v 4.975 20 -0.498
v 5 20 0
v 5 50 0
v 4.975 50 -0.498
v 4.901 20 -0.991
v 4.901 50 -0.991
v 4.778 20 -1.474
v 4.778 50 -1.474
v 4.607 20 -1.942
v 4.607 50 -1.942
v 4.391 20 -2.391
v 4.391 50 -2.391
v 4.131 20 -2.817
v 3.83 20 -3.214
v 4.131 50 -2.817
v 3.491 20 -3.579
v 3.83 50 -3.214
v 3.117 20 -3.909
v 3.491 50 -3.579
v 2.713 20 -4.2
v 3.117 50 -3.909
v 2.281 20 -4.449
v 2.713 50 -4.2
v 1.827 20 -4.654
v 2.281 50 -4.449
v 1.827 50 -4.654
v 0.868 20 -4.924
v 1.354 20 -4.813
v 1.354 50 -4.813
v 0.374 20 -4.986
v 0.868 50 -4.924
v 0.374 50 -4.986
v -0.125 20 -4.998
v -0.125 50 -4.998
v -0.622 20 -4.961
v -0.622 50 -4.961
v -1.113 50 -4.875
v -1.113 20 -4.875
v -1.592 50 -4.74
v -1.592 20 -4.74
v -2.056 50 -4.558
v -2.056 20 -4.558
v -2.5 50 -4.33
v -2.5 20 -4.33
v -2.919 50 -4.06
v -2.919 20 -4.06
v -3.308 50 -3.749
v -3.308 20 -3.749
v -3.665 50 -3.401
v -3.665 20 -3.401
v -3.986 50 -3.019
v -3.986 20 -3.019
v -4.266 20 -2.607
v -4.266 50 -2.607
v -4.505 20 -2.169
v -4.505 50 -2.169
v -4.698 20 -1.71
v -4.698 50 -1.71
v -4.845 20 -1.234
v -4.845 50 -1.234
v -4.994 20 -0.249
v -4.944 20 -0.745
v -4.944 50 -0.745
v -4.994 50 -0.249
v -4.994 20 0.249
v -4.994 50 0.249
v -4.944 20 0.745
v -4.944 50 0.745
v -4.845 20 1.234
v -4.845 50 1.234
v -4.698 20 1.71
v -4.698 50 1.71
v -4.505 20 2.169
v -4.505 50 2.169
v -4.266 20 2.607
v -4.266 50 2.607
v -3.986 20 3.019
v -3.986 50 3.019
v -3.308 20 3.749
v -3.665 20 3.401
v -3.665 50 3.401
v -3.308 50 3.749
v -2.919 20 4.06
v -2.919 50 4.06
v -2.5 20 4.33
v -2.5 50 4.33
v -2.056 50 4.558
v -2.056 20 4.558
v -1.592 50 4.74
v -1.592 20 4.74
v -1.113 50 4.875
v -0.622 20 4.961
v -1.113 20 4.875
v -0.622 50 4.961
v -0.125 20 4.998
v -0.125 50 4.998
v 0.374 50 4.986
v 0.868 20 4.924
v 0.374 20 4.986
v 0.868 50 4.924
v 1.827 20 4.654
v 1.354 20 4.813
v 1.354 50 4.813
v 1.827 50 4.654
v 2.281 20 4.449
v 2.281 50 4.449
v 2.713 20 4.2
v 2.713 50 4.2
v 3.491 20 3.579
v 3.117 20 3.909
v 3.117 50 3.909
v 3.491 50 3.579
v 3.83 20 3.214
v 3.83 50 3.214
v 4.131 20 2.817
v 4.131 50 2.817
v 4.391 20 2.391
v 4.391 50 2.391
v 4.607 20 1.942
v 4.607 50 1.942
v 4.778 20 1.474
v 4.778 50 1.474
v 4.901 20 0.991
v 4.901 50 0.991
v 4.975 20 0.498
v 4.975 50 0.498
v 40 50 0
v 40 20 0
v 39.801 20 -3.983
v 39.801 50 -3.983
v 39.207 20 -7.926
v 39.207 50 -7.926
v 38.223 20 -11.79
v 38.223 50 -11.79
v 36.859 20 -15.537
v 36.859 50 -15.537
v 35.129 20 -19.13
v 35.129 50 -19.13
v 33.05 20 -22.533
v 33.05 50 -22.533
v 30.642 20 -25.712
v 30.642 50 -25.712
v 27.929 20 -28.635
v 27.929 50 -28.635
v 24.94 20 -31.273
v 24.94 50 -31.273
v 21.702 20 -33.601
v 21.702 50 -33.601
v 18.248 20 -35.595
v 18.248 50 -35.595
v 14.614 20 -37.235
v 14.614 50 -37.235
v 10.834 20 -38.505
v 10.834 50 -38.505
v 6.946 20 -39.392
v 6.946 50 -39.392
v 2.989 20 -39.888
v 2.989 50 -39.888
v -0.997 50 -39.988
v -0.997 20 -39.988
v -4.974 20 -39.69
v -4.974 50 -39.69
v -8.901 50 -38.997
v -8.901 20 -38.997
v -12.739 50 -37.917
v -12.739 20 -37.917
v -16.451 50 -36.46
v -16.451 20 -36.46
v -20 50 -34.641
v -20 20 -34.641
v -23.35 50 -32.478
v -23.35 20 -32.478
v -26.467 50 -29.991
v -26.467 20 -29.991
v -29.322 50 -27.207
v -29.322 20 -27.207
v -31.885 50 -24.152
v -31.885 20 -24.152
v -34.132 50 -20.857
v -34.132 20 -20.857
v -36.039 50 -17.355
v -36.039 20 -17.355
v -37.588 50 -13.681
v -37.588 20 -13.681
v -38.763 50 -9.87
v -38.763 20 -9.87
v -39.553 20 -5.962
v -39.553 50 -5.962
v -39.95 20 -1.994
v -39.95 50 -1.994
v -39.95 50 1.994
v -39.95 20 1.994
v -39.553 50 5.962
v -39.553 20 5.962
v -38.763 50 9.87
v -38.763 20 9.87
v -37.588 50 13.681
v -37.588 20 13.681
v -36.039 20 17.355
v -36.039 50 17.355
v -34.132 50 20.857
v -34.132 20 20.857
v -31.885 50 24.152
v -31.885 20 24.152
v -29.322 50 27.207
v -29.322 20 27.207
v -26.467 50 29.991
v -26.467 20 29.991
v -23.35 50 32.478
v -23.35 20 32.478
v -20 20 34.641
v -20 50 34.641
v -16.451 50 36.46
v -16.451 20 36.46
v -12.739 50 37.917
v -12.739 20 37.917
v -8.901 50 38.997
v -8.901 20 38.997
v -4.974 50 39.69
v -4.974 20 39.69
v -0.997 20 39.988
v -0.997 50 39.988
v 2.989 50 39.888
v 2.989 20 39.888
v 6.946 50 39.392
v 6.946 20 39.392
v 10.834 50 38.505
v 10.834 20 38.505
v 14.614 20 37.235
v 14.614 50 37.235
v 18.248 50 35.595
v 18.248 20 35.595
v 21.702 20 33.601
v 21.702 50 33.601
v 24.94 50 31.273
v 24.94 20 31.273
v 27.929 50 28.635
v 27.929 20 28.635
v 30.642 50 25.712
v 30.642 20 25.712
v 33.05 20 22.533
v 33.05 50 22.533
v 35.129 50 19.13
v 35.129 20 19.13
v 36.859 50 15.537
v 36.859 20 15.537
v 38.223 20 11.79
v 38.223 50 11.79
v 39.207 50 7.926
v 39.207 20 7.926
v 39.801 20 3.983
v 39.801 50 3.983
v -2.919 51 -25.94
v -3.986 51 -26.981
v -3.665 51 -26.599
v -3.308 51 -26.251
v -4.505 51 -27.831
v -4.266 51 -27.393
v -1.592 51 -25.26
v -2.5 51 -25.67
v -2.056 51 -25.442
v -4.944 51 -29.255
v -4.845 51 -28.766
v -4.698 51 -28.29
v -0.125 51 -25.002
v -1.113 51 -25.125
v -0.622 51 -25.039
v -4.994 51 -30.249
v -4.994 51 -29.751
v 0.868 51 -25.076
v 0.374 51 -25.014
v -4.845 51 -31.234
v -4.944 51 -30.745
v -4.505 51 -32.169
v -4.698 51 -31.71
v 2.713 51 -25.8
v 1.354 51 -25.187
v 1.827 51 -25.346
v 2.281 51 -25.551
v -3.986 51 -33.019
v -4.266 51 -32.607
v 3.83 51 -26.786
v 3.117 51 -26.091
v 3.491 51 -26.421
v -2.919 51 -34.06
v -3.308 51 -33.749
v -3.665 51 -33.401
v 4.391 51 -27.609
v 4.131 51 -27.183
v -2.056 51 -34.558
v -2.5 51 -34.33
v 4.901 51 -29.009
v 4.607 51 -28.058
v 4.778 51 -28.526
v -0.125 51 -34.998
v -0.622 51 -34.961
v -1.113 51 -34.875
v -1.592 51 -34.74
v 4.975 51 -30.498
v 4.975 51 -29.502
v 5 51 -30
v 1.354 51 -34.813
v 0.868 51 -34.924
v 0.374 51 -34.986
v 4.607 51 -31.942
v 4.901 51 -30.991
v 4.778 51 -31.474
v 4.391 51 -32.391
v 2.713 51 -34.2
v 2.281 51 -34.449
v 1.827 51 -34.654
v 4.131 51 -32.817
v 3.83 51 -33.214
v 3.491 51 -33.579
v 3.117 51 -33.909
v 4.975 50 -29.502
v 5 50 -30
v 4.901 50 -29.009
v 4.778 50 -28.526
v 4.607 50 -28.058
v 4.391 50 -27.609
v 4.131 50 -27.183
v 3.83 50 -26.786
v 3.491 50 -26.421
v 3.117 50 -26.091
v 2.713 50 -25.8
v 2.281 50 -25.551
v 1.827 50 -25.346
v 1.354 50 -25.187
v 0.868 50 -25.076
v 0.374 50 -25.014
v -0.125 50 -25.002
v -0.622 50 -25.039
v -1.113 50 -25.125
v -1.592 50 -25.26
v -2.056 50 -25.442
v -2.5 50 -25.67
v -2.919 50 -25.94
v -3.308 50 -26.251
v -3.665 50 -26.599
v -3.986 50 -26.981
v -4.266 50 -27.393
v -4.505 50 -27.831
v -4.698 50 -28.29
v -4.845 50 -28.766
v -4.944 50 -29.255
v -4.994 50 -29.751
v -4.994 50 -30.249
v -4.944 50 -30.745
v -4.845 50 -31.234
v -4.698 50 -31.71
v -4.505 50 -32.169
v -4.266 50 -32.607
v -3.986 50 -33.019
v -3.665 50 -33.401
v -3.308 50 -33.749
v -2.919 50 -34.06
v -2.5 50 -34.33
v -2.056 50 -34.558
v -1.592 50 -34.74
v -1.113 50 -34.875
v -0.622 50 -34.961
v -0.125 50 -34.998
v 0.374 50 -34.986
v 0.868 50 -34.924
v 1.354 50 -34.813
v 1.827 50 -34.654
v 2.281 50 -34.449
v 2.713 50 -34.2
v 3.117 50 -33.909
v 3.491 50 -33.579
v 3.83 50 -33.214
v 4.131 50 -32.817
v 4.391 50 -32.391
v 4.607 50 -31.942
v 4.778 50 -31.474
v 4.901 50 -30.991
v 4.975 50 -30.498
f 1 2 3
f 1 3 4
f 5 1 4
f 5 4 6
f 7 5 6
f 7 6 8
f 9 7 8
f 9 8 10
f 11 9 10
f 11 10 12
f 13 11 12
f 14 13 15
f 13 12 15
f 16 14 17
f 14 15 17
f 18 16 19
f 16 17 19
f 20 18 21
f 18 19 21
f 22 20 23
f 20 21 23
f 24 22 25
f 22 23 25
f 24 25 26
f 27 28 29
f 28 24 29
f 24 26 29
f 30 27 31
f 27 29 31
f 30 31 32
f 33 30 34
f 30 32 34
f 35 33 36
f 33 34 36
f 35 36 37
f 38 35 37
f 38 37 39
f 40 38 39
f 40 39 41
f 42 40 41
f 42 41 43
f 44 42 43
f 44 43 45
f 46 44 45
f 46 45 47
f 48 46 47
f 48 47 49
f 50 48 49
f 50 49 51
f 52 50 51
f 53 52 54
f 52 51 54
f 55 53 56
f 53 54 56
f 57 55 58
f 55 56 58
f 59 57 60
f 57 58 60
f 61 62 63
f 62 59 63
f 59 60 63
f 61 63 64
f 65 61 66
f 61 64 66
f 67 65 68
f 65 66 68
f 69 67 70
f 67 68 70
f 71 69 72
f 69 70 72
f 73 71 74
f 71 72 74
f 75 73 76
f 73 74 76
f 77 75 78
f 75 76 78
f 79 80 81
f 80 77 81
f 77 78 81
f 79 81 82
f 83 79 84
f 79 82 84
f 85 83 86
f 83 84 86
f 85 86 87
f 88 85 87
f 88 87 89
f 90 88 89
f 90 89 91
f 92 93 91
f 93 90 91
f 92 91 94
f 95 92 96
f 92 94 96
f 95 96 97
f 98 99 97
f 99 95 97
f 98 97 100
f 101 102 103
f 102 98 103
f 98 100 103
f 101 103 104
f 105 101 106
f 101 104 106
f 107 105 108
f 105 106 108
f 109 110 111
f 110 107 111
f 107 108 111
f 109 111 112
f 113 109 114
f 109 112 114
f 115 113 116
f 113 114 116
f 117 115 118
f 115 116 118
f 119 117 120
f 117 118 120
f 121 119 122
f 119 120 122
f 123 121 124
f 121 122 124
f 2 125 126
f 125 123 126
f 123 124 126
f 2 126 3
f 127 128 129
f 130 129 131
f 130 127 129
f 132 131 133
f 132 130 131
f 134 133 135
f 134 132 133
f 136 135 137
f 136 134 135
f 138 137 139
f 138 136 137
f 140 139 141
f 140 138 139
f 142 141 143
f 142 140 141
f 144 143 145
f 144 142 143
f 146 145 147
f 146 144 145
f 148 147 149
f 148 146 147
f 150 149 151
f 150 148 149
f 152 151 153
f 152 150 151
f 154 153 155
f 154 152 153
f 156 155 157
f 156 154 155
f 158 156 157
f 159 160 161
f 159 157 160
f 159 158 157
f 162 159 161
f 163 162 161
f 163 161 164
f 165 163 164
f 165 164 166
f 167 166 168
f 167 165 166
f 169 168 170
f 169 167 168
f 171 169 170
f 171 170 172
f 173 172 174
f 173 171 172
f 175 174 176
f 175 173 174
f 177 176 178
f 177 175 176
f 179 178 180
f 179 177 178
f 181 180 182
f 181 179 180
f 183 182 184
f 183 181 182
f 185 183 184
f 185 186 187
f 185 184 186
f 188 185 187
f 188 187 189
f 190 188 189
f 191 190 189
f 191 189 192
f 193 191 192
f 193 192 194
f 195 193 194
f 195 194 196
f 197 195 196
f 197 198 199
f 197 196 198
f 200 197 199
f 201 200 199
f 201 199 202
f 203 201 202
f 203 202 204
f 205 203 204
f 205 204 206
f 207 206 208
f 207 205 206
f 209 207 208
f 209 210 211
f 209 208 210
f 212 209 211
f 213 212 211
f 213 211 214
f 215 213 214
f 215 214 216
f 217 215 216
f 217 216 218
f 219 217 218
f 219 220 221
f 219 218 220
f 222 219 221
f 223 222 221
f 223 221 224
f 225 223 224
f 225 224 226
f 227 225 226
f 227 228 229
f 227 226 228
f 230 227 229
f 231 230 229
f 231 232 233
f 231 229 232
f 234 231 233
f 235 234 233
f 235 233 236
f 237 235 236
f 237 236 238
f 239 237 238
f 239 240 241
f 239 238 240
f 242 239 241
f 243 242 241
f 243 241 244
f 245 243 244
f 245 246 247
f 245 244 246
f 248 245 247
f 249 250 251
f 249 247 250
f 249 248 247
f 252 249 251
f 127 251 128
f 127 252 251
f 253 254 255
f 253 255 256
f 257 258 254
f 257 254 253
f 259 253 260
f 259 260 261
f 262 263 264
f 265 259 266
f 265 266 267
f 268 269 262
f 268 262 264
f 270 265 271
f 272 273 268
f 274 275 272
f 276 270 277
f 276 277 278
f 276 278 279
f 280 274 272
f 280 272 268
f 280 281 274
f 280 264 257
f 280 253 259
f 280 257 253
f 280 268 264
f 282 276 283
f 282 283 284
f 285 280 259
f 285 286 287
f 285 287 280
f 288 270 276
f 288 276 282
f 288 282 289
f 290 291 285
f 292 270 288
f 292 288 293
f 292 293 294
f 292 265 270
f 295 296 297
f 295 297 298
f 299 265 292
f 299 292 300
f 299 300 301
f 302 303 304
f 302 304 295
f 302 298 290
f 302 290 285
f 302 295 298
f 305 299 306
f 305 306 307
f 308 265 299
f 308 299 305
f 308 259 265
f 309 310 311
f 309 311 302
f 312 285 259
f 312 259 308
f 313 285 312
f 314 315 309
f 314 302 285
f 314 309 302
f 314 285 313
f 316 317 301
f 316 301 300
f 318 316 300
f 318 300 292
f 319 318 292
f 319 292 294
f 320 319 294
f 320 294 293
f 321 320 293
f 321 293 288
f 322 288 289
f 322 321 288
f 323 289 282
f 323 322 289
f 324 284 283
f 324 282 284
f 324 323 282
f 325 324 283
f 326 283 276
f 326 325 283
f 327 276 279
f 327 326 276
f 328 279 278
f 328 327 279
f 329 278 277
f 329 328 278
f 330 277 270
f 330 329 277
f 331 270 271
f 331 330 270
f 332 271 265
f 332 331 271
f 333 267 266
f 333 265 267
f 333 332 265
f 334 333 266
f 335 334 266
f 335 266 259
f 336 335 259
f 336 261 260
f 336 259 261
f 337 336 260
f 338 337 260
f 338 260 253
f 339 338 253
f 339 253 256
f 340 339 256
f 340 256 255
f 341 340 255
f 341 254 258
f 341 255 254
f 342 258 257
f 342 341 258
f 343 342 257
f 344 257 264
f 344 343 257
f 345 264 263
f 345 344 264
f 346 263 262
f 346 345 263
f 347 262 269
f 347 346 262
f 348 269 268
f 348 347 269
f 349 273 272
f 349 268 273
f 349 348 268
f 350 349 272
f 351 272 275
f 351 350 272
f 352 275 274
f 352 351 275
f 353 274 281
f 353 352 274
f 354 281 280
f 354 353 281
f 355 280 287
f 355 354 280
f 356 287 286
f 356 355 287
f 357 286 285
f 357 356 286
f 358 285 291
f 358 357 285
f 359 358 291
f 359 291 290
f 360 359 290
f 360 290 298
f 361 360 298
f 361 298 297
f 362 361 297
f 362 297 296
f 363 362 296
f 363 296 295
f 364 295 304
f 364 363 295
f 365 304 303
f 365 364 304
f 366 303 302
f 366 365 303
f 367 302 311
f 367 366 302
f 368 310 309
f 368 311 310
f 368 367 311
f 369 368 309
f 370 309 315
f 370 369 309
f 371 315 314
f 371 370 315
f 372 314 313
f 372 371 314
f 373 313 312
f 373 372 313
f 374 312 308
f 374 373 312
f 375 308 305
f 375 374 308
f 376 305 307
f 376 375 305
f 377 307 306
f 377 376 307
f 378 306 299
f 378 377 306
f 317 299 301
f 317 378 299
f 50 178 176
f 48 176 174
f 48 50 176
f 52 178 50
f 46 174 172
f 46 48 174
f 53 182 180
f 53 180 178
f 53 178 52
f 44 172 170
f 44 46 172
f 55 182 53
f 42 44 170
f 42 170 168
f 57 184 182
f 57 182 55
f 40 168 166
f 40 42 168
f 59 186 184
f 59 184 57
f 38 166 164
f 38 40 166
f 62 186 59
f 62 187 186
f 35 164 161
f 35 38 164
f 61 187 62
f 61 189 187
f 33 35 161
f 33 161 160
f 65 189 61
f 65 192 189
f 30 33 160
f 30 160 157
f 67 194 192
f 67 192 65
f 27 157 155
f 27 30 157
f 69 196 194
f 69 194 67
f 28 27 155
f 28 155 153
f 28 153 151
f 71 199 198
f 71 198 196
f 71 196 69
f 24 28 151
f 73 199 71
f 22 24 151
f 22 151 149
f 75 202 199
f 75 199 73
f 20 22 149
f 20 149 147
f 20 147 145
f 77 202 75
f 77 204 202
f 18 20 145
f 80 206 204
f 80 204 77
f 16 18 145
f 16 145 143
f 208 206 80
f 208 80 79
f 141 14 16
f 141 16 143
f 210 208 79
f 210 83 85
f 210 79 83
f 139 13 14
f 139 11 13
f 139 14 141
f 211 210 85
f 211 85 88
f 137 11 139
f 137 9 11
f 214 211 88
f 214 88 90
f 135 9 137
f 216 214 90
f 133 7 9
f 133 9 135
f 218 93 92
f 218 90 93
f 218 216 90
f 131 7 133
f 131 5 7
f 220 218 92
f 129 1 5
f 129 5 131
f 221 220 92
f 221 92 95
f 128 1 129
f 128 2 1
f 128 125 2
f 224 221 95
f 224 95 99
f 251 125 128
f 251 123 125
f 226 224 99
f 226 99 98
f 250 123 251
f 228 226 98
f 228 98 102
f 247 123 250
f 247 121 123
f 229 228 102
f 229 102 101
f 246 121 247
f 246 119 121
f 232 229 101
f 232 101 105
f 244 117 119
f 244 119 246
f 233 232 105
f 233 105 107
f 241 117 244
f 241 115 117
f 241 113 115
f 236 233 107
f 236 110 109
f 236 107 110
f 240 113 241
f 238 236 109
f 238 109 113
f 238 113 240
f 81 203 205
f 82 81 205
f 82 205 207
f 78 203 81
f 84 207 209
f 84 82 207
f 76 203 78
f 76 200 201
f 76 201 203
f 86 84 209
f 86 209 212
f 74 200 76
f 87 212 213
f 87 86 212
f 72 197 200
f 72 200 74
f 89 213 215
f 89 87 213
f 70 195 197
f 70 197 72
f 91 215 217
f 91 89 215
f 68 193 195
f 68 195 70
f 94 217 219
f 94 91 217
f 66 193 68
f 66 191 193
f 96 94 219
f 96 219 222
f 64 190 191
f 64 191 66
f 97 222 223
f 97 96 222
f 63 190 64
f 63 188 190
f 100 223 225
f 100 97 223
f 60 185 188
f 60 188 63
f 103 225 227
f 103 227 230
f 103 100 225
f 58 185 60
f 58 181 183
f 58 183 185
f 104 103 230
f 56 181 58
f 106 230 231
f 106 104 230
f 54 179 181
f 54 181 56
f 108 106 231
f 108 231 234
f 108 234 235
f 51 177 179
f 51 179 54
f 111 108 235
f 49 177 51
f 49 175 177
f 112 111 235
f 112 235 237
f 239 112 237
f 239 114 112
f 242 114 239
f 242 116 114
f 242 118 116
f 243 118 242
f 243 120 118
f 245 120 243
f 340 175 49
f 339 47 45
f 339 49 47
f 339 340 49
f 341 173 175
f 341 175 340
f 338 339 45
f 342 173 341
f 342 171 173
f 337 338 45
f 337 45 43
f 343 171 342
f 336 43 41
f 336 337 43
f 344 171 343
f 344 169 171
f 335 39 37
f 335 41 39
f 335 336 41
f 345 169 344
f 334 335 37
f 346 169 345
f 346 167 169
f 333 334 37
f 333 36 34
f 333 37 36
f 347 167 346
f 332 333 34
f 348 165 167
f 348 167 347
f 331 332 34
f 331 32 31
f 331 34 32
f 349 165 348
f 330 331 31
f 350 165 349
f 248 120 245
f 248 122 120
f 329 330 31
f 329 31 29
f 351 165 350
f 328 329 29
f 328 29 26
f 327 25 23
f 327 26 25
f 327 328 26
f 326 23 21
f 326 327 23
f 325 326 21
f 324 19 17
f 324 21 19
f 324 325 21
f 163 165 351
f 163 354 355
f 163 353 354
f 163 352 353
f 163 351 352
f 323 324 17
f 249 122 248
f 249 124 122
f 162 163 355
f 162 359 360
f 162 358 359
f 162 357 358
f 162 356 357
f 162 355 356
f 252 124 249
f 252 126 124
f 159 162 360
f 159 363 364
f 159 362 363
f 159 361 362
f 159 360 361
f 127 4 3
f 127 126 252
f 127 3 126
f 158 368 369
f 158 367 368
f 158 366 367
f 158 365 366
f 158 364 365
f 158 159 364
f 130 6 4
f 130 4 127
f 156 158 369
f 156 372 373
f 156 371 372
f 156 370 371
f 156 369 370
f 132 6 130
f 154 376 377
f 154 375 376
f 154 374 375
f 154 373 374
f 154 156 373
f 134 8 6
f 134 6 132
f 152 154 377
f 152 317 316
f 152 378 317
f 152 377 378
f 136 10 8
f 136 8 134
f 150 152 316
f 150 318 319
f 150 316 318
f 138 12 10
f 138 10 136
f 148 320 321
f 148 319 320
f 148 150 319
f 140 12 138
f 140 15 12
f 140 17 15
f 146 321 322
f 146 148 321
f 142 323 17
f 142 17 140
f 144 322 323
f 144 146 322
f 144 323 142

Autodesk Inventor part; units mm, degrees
ref_plane "YZ Plane" through (0, 0, 0) normal (1, 0, 0) x (0, 1, 0)
ref_plane "XZ Plane" through (0, 0, 0) normal (0, 1, 0) x (-1, 0, 0)
ref_plane "XY Plane" through (0, 0, 0) normal (0, 0, 1) x (1, 0, 0)
sketch "Sketch1" plane through (0, 0, 0) normal (0, 1, 0) x (-1, 0, 0)
  circle A0 centre (0, 0) radius 20
  dimension "d24" = 40
extrude "Extrusion1" add sketch "Sketch1" along normal blind 50
sketch "Sketch2" plane through (0, 50, 0) normal (0, 1, 0) x (1, 0, 0)
  circle A0 centre (0, 0) radius 55
  dimension "d3" = 110
extrude "Extrusion2" add sketch "Sketch2" against normal blind 50
sketch "Sketch3" plane through (0, 50, 0) normal (0, 1, 0) x (1, 0, 0)
  circle A0 centre (0, 0) radius 5
  dimension "d6" = 10
extrude "Extrusion3" cut sketch "Sketch3" against normal blind 50
sketch "Sketch4" plane through (0, 50, 0) normal (0, 1, 0) x (1, 0, 0)
  circle A0 centre (0, -45) radius 5
  point P0 (0, 0)
  dimension "d9" = 10
extrude "Extrusion4" add sketch "Sketch4" along normal blind 1
sketch "Sketch5" plane through (0, 50, 0) normal (0, 1, 0) x (1, 0, 0)
  circle A0 centre (0, 0) radius 40
  dimension "d12" = 80
extrude "Extrusion5" cut sketch "Sketch5" against normal through all keep common part
sketch "Sketch6" plane through (0, 50, 0) normal (0, 1, 0) x (1, 0, 0)
  circle A0 centre (0, 0) radius 40
sketch "Sketch7" plane through (0, 0, 0) normal (0, -1, 0) x (1, 0, 0)
  circle A0 centre (0, 0) radius 40
extrude "Extrusion6" cut sketch "Sketch7" against normal blind 10
sketch "Sketch8" plane through (0, 50, 0) normal (0, 1, 0) x (1, 0, 0)
  circle A0 centre (0, 30) radius 5
  point P0 (0, 0)
  dimension "d17" = 10
extrude "Extrusion7" add sketch "Sketch8" along normal blind 1
sketch "Sketch9" plane through (0, 50, 0) normal (0, 1, 0) x (1, 0, 0)
  circle A0 centre (0, 0) radius 2.5
  dimension "d20" = 5
sketch "Sketch10" plane through (0, 10, 0) normal (0, -1, 0) x (1, 0, 0)
  circle A0 centre (0, 0) radius 5 projected
  circle A1 centre (0, 0) radius 40
extrude "Extrusion8" cut sketch "Sketch10" against normal blind 10
